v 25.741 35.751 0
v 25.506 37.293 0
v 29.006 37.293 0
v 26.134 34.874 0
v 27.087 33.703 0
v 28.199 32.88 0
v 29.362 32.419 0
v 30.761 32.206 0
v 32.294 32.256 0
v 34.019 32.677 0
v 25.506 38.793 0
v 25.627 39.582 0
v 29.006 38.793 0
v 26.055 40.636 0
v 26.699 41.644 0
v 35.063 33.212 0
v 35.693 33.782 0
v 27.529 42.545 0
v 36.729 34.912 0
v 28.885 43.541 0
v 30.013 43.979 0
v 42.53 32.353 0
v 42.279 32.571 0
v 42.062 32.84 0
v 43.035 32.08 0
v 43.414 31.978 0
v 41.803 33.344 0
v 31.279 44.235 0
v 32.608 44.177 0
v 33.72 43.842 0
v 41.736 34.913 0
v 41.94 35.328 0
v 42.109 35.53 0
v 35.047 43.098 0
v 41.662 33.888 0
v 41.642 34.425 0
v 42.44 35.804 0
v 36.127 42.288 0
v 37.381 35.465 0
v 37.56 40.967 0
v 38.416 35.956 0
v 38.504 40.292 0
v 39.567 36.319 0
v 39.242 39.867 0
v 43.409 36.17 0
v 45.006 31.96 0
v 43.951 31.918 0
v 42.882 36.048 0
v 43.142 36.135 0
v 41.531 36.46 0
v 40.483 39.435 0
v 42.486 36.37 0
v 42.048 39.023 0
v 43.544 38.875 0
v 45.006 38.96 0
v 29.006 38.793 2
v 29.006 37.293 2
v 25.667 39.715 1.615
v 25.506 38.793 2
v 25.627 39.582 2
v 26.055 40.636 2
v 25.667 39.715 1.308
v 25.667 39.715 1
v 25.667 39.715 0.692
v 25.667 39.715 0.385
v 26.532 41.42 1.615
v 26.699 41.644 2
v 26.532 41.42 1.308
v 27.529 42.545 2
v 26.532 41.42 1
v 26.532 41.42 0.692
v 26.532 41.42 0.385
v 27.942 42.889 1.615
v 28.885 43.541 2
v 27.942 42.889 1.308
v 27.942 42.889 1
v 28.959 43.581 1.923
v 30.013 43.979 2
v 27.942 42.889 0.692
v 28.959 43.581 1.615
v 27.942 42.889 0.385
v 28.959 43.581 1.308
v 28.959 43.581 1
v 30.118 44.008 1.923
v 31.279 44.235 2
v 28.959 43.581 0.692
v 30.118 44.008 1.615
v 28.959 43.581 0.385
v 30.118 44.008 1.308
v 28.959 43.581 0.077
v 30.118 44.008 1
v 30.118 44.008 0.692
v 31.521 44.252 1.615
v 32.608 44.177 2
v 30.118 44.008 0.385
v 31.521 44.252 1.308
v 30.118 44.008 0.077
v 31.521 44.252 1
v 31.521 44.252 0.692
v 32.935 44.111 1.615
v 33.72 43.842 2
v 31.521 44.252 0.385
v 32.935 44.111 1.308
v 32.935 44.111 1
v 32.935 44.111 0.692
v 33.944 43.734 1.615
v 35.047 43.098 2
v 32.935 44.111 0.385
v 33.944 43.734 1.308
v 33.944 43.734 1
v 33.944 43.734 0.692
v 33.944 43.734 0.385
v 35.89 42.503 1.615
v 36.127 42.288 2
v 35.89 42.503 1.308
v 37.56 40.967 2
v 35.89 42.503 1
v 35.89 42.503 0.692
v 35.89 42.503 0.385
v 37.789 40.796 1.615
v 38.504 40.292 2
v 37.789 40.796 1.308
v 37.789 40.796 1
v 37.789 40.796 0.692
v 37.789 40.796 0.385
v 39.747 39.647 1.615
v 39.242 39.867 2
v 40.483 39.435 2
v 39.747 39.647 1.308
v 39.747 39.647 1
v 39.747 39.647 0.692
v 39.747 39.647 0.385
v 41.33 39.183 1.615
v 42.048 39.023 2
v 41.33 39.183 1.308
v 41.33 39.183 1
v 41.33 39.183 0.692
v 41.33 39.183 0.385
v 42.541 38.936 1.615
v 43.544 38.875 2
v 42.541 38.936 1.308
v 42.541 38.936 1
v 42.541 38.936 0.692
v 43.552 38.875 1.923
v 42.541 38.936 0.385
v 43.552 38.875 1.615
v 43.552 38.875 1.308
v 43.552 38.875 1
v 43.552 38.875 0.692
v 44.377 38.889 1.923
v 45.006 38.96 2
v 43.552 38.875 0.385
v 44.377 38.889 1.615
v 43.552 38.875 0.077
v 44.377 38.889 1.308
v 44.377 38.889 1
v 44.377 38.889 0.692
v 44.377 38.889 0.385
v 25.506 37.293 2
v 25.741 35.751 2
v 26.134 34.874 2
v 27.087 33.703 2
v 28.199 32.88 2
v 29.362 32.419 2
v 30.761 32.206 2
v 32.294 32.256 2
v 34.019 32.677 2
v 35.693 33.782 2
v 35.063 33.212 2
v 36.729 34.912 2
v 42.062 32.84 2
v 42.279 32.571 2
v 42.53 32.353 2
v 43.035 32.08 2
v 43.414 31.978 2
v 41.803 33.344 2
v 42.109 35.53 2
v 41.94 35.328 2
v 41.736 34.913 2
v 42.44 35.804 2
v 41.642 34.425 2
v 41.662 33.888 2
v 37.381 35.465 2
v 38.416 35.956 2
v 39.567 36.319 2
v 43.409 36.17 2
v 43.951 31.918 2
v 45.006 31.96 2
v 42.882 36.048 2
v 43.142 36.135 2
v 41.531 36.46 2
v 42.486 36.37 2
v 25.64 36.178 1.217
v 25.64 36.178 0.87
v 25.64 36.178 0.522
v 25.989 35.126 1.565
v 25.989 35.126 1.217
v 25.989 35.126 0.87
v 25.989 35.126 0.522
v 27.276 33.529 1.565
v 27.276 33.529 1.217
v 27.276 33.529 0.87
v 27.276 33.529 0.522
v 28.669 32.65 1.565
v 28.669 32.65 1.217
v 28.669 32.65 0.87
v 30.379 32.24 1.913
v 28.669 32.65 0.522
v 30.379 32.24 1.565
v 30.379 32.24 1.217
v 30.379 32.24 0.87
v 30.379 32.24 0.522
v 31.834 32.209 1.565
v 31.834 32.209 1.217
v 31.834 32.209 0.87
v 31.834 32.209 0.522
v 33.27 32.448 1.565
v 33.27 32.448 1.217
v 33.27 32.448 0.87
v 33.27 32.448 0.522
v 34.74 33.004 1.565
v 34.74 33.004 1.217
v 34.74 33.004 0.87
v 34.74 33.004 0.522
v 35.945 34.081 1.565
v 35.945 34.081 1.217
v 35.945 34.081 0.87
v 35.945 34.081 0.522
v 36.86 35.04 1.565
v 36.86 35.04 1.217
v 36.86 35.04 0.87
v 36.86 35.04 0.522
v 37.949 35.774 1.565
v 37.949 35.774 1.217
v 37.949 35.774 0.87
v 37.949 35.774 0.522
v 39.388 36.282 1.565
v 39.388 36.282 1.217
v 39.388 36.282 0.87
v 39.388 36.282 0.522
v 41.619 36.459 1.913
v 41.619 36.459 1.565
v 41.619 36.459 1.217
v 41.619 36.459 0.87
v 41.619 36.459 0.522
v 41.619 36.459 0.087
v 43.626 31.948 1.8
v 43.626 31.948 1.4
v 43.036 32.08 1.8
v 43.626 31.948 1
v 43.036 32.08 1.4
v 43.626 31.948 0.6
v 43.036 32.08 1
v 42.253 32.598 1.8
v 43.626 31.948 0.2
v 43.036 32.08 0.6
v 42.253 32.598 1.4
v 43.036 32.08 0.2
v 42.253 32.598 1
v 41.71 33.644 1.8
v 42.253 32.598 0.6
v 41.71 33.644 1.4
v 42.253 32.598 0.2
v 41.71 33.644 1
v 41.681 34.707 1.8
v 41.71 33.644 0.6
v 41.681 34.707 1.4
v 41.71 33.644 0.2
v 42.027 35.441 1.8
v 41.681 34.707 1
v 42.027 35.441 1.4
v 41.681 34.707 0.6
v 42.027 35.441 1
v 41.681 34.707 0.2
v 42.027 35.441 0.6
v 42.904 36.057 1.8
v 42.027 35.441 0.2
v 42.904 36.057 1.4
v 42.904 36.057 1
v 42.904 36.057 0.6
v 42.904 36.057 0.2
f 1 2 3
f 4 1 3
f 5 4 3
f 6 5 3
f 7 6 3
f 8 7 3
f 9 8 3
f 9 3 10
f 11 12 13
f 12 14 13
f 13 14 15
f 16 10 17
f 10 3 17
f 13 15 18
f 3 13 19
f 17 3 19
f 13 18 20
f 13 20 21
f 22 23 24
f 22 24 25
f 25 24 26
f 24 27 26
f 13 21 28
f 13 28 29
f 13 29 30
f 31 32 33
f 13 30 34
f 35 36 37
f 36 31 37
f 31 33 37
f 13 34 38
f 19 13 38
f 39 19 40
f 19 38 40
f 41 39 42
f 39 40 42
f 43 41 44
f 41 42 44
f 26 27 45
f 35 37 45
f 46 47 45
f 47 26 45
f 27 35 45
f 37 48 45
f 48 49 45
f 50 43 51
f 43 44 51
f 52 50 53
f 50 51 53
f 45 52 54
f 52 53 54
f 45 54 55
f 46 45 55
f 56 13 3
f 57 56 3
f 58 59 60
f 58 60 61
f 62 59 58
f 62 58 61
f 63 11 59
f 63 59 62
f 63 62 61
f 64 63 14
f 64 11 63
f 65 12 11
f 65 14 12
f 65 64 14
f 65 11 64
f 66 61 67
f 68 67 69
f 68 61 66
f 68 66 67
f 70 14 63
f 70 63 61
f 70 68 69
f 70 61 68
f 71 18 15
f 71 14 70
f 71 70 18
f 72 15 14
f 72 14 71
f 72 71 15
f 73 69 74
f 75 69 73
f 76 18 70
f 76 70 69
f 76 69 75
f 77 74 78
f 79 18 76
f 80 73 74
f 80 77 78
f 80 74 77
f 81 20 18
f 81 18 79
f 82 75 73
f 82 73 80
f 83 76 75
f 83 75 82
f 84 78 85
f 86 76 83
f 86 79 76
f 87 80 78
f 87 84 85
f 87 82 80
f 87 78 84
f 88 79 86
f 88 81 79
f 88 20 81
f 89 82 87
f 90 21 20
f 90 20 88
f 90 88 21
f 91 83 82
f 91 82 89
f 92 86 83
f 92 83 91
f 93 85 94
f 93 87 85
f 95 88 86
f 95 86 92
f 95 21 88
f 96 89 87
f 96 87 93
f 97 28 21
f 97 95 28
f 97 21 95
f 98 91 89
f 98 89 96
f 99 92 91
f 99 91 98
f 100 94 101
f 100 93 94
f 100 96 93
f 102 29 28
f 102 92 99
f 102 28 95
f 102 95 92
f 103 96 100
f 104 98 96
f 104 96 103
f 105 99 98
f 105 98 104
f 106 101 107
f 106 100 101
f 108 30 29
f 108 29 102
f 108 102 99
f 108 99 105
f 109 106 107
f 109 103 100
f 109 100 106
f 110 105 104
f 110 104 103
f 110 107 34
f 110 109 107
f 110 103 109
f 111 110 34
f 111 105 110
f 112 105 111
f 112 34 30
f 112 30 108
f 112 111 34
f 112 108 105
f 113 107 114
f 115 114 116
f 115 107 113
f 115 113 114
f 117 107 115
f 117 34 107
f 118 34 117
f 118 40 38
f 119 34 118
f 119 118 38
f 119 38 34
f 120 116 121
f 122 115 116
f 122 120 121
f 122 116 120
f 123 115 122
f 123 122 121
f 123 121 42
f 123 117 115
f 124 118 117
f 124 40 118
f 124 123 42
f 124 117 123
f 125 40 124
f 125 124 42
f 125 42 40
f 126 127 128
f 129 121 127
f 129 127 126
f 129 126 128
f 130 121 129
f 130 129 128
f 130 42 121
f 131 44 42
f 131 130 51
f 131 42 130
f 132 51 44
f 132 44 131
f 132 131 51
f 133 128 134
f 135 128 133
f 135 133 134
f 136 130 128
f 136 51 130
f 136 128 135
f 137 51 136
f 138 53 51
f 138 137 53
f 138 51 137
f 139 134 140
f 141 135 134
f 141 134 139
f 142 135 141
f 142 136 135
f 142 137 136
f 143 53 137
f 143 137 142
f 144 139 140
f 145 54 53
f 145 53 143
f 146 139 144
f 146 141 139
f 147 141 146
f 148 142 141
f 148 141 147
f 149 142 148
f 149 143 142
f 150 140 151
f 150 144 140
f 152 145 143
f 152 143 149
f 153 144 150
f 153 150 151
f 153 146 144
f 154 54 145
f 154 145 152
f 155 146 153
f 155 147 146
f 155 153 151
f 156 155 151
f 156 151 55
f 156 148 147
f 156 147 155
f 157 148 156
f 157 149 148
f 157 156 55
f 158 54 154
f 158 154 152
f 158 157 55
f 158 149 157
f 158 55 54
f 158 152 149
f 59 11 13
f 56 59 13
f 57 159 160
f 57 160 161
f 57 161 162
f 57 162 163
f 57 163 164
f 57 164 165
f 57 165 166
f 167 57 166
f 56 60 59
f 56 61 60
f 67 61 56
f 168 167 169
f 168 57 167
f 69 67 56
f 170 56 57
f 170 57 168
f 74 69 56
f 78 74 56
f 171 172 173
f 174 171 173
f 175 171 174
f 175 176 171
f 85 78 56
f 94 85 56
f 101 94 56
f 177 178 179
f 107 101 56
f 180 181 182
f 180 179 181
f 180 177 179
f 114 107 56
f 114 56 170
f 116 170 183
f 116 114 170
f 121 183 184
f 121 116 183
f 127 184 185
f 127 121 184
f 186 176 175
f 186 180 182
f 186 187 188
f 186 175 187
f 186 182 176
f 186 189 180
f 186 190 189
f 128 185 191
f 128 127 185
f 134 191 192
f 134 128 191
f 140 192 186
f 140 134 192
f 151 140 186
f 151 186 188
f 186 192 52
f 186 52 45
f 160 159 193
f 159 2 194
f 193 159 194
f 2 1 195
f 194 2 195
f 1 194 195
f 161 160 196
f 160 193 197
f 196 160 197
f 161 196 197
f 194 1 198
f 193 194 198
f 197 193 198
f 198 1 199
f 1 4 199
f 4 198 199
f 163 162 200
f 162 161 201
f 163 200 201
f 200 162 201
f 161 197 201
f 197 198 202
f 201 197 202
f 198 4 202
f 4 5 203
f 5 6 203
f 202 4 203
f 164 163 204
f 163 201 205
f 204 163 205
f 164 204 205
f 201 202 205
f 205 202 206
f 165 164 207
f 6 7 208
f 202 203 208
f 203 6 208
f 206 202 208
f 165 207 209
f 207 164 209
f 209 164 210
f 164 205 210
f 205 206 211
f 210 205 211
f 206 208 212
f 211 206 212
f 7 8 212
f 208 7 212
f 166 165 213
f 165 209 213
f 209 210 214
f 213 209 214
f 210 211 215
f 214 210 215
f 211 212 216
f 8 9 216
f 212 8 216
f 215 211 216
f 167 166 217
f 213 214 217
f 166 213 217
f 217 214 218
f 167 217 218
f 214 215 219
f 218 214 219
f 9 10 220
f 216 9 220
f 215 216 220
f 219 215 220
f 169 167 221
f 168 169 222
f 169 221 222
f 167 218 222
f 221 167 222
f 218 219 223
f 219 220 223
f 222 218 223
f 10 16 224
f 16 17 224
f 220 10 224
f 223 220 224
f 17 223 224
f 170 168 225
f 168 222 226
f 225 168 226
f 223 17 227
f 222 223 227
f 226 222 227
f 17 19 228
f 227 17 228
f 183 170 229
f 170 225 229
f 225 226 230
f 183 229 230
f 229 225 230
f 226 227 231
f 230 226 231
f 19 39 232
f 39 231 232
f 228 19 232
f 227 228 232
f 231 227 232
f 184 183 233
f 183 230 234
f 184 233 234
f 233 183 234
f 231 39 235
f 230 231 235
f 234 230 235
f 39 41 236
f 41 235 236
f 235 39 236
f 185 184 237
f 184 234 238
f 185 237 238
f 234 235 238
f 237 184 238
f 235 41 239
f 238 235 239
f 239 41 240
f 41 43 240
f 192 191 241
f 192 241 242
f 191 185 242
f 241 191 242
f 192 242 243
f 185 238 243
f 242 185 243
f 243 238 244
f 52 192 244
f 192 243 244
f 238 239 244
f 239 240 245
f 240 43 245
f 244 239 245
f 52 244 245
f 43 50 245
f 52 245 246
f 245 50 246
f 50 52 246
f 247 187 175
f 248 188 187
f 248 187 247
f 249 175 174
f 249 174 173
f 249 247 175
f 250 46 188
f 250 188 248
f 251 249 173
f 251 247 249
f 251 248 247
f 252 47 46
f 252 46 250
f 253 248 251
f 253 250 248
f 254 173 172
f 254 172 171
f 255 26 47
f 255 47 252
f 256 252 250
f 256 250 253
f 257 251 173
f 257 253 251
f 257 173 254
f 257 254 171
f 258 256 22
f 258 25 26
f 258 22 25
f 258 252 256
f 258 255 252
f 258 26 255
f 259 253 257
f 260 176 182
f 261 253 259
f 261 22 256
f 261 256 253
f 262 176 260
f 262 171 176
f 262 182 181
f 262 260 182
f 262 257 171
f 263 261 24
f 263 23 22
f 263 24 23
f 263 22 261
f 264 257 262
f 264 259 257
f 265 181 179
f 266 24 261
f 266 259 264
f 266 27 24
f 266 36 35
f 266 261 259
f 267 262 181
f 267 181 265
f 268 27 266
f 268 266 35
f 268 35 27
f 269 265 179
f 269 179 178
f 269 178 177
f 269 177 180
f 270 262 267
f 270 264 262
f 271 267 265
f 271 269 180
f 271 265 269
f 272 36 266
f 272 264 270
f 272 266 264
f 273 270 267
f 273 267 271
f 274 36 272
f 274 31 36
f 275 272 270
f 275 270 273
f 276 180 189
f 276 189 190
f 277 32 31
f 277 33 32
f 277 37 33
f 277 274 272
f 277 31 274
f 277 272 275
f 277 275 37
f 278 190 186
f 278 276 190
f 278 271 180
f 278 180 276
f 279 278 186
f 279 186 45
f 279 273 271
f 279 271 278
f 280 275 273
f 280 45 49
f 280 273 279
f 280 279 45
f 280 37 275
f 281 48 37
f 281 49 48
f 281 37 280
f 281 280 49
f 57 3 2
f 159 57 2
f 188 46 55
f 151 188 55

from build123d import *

# Parameters (mm, degrees)
F1_DEPTH = 2


with BuildPart() as f1:
    # F0 (on Top) → F1 (new body)
    with BuildSketch(Plane.XY):
        with BuildLine():
            Line((29.0056911222, 37.2932067769), (25.5056911222, 37.2932067769))
            add(Edge.make_bspline(
                [(25.5056911222, 37.2932067769), (25.5123893198, 37.1239796799), (25.5269370782, 36.8375945795), (25.6416827385, 36.1646228651), (25.6965987603, 35.870593877), (25.9586383582, 35.0654512779), (26.5634046516, 34.2754670616), (27.2498166005, 33.4740173498), (28.6422781275, 32.5305453944), (30.3661225189, 32.1946150546), (31.8347660495, 32.1640151789), (33.2706610039, 32.4047615549), (34.7459508282, 32.9075349293), (35.5912433708, 33.6320548308), (35.9318703652, 34.0828349686), (36.3689217963, 34.53972979), (36.852229414, 35.0494790349), (37.3439377946, 35.4660096018), (37.9454599091, 35.7958645854), (38.6558933141, 36.0362860043), (39.3967060117, 36.3258461841), (40.3153013553, 36.4001734293), (41.6189307194, 36.4971112372), (42.52205072, 36.37893891), (43.0889321098, 36.2439211109), (43.4094676731, 36.1699839479)],
                knots=[0, 0, 0, 0, 0.0314044471, 0.067823015, 0.0932533488, 0.1337564893, 0.179291164, 0.225764783, 0.2839825277, 0.3441434722, 0.398858297, 0.4536038469, 0.5104626838, 0.5574396985, 0.5911016835, 0.626787733, 0.664943676, 0.7012933061, 0.738606545, 0.7778968431, 0.8178661635, 0.8616686436, 0.9135392759, 0.9567849896, 1, 1, 1, 1], degree=3))
            add(Edge.make_bspline(
                [(45.0056911222, 31.9599839479), (44.6498870319, 31.9027877396), (44.2200911623, 31.8971006378), (43.6171287374, 31.9397267373), (43.0082244256, 32.0406101946), (42.1602186595, 32.5395680892), (41.6259363602, 33.6192455114), (41.6083624593, 34.7070531631), (41.9612334381, 35.4652618667), (42.5392842899, 35.8829550478), (42.8826759736, 36.0640771138), (43.2523710978, 36.1756302257), (43.4094676731, 36.1699839479)],
                knots=[0, 0, 0, 0, 0.105504634, 0.1926208758, 0.2830648303, 0.3958057973, 0.5220854239, 0.6420663037, 0.7468048535, 0.8423063503, 0.9162421161, 1, 1, 1, 1], degree=3))
            Line((45.0056911222, 31.9599839479), (45.0056911222, 38.9599839479))
            add(Edge.make_bspline(
                [(25.5056911222, 38.7932067769), (25.5315492059, 38.9037149986), (25.5327541276, 39.1923308861), (25.6506118006, 39.7375433246), (26.0215552759, 40.6185581861), (26.5026079416, 41.4270093383), (27.2395702998, 42.3097679885), (27.9306239878, 42.8942036511), (28.9462072453, 43.6523268701), (30.117082146, 44.0292619578), (31.5043059567, 44.335430922), (32.9548553824, 44.1561609265), (33.935516194, 43.7792408197), (35.1342587441, 43.0476239534), (35.8981926154, 42.562426552), (37.0414389181, 41.3509192279), (37.7740978211, 40.8052754631), (38.6849635289, 40.139991487), (39.7285175087, 39.6085376156), (40.5027161526, 39.4475068525), (41.3197861815, 39.1669612807), (41.9940726923, 39.0333087207), (42.5361993004, 38.9288690794), (43.0531876241, 38.8777905672), (43.5532982232, 38.8716407637), (43.9346417228, 38.882960308), (44.4483870749, 38.8770602098), (44.6252153456, 38.9307901357), (45.0056911222, 38.9599839479)],
                knots=[0, 0, 0, 0, 0.0252705223, 0.055886485, 0.0957115014, 0.1361743643, 0.1795642065, 0.218941931, 0.2644141513, 0.3099917689, 0.3589307229, 0.4078040093, 0.4503567139, 0.4978576833, 0.5381089589, 0.5900966212, 0.6300392892, 0.6732674646, 0.7175172482, 0.7541015751, 0.7919749549, 0.826069659, 0.8563445407, 0.8859488349, 0.914730391, 0.9404599448, 0.9673812596, 1, 1, 1, 1], degree=3))
            Line((25.5056911222, 38.7932067769), (29.0056911222, 38.7932067769))
            Line((29.0056911222, 38.7932067769), (29.0056911222, 37.2932067769))
        make_face()
    extrude(amount=F1_DEPTH)


solid = f1.part
